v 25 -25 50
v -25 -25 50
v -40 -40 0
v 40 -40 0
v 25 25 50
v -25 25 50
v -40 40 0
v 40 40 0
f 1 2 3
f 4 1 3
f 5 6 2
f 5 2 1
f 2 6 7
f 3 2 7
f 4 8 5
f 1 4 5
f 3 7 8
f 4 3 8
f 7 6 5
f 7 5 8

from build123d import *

# Parameters (mm, degrees)
ESBO_O1_W                = 80
ESBO_O1_H                = 80
RESSALTO_EXTRUS_O1_DEPTH = 50
CORTE_EXTRUS_O3_DEPTH    = 103.46950766
CORTE_EXTRUS_O4_DEPTH    = 103.46950766


with BuildPart() as part:
    # Esboço1 → Ressalto-extrusão1 (new body)
    with BuildSketch(Plane.XY):
        Rectangle(ESBO_O1_W, ESBO_O1_H)
    extrude(amount=RESSALTO_EXTRUS_O1_DEPTH)

    # Esboço3 → Corte-extrusão3 (cut, through all)
    with BuildSketch(Plane.ZY.offset(40)):
        Polygon((50, 25), (0, 40), (50, 40), align=None)
        Polygon((50, -25), (0, -40), (50, -40), align=None)
    extrude(amount=-CORTE_EXTRUS_O3_DEPTH, mode=Mode.SUBTRACT)

    # Esboço8 → Corte-extrusão4 (cut, through all)
    with BuildSketch(Plane(origin=(0, -40, 0), x_dir=(-1, 0, 0), z_dir=(0, -1, 0))):
        Polygon((25, -50), (40, 0), (40, -50), align=None)
        Polygon((-25, -50), (-40, -50), (-40, 0), align=None)
    extrude(amount=-CORTE_EXTRUS_O4_DEPTH, mode=Mode.SUBTRACT)


solid = part.part
